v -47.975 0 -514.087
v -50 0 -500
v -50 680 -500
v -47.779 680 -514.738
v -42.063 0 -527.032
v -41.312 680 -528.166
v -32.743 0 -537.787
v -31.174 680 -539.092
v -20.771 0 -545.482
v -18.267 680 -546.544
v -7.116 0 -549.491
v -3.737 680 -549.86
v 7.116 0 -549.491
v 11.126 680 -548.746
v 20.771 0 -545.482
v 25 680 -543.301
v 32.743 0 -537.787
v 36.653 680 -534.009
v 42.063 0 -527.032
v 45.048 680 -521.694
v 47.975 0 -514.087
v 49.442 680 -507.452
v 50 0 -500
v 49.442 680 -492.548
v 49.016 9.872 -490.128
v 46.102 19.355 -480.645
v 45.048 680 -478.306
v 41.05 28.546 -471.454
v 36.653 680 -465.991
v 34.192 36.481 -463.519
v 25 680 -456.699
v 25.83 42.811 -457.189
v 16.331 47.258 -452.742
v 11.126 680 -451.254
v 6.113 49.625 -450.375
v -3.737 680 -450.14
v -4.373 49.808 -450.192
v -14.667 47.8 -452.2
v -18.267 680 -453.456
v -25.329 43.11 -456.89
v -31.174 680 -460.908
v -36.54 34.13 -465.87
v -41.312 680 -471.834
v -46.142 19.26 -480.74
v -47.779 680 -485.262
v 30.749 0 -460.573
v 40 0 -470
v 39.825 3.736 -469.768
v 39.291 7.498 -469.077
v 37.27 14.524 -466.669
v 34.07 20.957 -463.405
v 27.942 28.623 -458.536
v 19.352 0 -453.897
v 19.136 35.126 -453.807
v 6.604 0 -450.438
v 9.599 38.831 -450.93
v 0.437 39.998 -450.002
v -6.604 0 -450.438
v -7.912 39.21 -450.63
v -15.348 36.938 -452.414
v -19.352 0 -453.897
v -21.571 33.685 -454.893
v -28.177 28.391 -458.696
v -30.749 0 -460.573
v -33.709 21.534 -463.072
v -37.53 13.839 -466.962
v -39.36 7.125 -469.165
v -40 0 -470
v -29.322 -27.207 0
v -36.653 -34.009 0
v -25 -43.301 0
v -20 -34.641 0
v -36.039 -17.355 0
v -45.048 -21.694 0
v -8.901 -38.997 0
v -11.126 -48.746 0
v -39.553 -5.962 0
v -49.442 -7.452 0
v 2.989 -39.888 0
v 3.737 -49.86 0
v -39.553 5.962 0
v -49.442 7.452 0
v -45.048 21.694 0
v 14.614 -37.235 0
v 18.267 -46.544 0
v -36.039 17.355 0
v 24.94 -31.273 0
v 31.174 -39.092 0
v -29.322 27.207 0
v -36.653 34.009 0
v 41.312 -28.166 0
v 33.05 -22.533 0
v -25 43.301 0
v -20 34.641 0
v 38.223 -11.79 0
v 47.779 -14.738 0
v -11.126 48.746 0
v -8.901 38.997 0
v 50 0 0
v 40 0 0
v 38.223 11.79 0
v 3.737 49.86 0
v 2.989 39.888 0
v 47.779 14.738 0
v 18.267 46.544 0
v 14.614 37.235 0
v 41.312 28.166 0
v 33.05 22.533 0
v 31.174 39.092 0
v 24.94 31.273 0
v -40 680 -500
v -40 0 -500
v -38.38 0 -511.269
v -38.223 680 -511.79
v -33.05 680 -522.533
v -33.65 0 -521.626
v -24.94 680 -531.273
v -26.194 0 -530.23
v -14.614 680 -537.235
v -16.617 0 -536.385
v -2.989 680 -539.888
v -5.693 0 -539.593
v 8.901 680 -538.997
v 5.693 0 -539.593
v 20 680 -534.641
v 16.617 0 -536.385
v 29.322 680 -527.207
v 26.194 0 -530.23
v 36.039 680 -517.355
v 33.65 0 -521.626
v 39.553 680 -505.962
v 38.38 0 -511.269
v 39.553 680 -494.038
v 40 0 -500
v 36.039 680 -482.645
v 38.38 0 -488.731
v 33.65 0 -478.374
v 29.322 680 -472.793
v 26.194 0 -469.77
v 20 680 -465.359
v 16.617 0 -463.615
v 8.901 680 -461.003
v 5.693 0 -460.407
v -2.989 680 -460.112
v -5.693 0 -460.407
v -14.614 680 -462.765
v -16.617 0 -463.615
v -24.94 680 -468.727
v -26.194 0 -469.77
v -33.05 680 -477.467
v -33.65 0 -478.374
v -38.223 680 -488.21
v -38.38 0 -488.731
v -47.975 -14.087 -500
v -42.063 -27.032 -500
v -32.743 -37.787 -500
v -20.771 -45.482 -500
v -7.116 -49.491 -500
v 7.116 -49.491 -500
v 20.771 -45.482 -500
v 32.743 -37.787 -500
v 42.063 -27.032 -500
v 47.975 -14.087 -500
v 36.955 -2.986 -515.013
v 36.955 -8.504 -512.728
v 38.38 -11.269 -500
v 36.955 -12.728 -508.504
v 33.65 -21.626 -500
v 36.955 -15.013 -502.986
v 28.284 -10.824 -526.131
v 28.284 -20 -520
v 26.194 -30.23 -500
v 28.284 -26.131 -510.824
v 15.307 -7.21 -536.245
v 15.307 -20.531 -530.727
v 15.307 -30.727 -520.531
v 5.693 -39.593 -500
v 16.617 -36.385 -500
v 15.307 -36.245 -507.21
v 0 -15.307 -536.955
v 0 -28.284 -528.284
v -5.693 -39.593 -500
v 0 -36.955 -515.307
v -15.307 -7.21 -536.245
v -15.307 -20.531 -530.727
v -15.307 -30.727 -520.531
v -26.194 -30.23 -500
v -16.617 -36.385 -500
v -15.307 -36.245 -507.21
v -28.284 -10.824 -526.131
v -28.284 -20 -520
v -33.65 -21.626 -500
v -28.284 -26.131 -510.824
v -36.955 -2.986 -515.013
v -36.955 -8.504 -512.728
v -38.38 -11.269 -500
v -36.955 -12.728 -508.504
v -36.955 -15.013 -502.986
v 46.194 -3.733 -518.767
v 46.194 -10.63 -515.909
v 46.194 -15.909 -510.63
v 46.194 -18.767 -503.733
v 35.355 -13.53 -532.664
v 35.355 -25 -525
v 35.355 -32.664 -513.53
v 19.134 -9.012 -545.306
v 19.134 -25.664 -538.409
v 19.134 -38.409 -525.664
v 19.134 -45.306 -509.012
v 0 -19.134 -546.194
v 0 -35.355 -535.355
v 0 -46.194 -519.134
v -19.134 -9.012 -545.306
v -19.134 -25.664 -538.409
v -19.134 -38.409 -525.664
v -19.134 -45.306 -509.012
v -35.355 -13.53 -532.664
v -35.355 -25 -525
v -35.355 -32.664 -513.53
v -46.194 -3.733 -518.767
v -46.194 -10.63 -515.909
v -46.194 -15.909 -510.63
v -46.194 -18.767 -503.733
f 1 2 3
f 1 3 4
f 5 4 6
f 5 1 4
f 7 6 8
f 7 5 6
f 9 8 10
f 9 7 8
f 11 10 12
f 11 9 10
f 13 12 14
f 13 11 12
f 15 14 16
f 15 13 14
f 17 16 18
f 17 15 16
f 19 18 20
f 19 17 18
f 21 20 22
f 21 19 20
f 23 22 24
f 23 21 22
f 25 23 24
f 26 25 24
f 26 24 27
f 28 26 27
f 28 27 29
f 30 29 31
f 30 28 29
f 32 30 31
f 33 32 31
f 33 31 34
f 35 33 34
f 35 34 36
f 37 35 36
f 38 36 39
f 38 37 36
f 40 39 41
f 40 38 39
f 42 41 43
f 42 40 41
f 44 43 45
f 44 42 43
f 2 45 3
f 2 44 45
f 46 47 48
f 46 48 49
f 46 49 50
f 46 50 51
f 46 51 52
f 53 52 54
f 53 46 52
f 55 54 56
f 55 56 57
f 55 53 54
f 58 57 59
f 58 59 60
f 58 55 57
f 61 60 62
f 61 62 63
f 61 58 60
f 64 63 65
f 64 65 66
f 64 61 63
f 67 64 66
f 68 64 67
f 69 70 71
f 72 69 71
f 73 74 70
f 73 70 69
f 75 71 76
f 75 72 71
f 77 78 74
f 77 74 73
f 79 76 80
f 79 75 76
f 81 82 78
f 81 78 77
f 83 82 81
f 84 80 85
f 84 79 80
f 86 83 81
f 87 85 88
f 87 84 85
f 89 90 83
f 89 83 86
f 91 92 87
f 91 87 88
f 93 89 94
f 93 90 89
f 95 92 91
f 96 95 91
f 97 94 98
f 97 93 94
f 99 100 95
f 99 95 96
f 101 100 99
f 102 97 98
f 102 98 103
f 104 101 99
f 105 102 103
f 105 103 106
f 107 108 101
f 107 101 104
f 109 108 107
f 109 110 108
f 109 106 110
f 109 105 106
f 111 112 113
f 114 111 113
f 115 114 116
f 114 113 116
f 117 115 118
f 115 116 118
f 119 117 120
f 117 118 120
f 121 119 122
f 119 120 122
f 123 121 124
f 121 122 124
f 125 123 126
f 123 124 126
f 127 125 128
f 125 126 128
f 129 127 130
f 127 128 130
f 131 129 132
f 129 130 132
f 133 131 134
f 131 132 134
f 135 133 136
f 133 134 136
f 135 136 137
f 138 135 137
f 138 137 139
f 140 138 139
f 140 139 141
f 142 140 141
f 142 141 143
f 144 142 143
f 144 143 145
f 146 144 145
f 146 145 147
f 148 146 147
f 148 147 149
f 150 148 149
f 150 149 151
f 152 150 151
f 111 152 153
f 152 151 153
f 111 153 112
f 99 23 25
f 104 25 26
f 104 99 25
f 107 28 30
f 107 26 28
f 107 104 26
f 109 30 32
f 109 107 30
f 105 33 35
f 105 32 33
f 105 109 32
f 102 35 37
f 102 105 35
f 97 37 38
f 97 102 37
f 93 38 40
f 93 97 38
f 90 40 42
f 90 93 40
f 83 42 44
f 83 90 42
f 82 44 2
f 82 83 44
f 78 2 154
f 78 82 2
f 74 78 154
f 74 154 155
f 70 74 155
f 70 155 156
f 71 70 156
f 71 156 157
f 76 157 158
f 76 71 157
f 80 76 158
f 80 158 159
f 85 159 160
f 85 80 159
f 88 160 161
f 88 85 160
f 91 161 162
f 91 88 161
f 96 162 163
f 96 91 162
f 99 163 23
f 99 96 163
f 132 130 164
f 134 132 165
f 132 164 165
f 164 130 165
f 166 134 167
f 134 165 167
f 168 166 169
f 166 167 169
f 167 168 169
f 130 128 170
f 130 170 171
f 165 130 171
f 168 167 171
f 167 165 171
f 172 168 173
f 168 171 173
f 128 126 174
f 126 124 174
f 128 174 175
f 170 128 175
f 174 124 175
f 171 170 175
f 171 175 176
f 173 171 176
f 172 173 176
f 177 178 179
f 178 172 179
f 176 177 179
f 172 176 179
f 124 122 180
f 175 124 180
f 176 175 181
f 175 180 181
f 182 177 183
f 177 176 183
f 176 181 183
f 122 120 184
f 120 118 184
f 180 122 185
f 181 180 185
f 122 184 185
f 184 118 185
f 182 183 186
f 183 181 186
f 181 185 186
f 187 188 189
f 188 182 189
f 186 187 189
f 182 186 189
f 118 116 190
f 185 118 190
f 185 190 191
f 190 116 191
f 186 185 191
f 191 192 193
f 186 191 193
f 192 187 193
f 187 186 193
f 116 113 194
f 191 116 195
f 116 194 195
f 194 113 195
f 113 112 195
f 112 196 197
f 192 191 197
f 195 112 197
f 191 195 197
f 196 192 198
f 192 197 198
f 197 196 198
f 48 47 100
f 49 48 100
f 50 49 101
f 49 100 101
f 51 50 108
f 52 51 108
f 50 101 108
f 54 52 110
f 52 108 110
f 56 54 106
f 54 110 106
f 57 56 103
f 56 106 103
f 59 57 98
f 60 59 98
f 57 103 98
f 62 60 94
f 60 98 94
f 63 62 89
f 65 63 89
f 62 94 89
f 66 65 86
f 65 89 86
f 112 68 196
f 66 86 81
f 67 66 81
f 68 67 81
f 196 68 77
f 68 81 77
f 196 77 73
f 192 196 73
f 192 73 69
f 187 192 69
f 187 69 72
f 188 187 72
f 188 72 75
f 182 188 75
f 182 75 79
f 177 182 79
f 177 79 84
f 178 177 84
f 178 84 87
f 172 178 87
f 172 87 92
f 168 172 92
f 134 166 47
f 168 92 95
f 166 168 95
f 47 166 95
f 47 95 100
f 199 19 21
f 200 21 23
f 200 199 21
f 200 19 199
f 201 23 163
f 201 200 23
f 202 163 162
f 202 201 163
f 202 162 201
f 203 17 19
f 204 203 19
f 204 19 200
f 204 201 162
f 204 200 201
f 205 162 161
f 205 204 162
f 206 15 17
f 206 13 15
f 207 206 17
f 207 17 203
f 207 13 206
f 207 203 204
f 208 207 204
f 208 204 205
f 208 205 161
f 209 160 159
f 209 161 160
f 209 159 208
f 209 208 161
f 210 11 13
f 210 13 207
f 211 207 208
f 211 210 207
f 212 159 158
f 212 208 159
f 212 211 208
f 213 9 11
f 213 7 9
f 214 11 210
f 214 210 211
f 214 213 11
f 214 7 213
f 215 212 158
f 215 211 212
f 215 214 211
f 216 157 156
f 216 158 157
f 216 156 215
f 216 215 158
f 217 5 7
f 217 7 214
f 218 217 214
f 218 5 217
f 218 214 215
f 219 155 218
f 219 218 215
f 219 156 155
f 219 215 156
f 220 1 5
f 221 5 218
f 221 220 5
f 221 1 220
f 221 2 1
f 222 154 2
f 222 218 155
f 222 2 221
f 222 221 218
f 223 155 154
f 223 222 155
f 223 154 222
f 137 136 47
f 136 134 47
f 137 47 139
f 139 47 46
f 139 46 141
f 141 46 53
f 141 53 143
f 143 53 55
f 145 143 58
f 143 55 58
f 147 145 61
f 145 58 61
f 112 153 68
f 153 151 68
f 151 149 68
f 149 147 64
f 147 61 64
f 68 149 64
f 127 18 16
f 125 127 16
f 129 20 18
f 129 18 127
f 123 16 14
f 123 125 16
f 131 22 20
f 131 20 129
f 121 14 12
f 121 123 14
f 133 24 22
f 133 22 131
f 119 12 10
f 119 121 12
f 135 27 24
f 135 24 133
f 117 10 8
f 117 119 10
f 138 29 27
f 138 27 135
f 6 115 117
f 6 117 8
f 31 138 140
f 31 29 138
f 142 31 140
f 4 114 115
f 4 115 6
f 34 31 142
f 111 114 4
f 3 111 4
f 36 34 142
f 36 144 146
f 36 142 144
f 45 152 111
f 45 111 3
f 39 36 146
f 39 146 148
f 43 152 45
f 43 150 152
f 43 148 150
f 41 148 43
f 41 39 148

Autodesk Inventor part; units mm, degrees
ref_plane "YZ Plane" through (0, 0, 0) normal (1, 0, 0) x (0, 1, 0)
ref_plane "XY Plane" through (0, 0, 0) normal (0, 0, 1) x (1, 0, 0)
sketch "Sketch1" plane through (0, 0, 0) normal (0, 0, 1) x (1, 0, 0)
  circle A0 centre (0, 0) radius 50
  circle A1 centre (0, 0) radius 40
  dimension "d0" = 100
  dimension "d1" = 80
extrude "Extrusion1" add sketch "Sketch1" against normal blind 500
ref_plane "Work Plane1" through (0, 0, -500) normal (0, 0, -1) x (-1, 0, 0)
sketch "Sketch2" plane through (0, 0, -500) normal (0, 0, -1) x (-1, 0, 0)
  circle A0 centre (0, 0) radius 50 projected
  circle A1 centre (0, 0) radius 40 projected
  line L0 (0, 0) -> (0, 50)
sketch "Sketch3" plane through (0, 0, 0) normal (0, 1, 0) x (-1, 0, 0)
  point P0 (0, 0)
sketch "Sketch4" plane through (0, 0, 0) normal (0, 1, 0) x (-1, 0, 0)
  line L0 (70, -500) -> (-70, -500) projected
  line L1 (-50, -500) -> (50, -500) projected
  circle A0 centre (0, -500) radius 40
  circle A1 centre (0, -500) radius 50
  point P0 (0, 0)
  point P1 (40, -500)
  point P2 (-40, -500)
  dimension "d5" = 80
  dimension "d6" = 100
sketch "Sketch6" plane through (0, 0, 0) normal (0, 1, 0) x (-1, 0, 0)
  point P0 (0, 0)
sketch "Sketch7" plane through (0, 0, 0) normal (0, 1, 0) x (-1, 0, 0)
  line L0 (-40, -500) -> (-40, -500) projected
  circle A0 centre (0, -500) radius 40
  line L1 (-50, -500) -> (-50, -500) projected
  circle A1 centre (0, -500) radius 50
  point P0 (0, 0)
  point P1 (50, -400)
  point P2 (40, -400)
ref_plane "Work Plane4" through (50, 0, -500) normal (0, 0.7071, -0.7071) x (-1, 0, 0)
split "Split2" plane through (50, 0, -500) removes the side toward (0, 0.7071, -0.7071)
extrude "Extrusion3" add sketch "Sketch7" along normal blind 680
revolve "Revolution2" add sketch "Sketch4" angle 90 about axis through (0, 0, -500) along (-1, 0, 0) picked at (-46.3464, -503.2515) contours A1 L0 A0
ref_plane "Work Plane5" through (0, 680, -500) normal (0, 1, 0) x (1, 0, 0)
properties part number "Z3" material "Steel, Alloy"
